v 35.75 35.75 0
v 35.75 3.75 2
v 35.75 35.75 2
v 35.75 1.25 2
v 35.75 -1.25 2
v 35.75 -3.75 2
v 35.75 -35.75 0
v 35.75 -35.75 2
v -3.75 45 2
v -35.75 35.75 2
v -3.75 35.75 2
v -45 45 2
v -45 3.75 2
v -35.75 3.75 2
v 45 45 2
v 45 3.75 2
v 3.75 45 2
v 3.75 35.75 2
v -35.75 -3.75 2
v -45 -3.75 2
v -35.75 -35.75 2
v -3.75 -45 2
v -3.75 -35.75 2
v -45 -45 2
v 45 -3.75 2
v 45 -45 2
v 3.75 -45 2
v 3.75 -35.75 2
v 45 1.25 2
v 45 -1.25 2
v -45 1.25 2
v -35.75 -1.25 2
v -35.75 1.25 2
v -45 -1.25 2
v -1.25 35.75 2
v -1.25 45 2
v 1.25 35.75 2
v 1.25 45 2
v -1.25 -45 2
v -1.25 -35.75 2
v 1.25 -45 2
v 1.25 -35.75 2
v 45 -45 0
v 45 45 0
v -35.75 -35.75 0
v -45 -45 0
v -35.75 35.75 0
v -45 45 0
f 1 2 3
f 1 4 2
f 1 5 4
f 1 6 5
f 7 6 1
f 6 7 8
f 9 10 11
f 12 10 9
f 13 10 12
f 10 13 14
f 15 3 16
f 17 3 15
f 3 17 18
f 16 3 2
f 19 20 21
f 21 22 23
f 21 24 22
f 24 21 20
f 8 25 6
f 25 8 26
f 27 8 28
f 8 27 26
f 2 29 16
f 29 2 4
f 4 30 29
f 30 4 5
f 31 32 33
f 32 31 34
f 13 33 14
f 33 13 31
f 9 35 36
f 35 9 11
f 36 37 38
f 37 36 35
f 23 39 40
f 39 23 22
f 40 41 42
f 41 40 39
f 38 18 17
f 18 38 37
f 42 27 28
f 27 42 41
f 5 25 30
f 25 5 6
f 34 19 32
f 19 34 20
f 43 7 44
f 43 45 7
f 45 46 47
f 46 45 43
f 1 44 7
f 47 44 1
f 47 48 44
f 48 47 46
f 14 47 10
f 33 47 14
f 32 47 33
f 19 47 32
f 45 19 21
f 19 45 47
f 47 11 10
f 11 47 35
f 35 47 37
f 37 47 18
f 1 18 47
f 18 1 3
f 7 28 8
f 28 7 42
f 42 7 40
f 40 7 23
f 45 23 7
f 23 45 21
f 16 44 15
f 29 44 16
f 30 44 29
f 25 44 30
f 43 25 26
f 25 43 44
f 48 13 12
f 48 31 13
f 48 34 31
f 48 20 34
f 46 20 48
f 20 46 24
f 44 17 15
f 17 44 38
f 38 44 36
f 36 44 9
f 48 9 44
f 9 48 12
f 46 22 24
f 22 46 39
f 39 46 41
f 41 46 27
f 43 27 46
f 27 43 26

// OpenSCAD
// Built by bench/smallmodels/features/compiler.py from a list of features.
$fn = 64;
difference() {
  union() {
    translate([0, 0, 0]) translate([-45, -45, 0]) cube([90, 90, 2]);
  }
  union() {
    translate([0, 0, 0]) rotate([0, 0, 0]) translate([-35.75, -35.75, 0]) cube([71.5, 71.5, 2]);
    translate([0, -177.5, 2]) rotate([0, 0, 0]) translate([-45, -1.25, 0]) cube([90, 2.5, 38]);
    translate([0, -87.5, 2]) rotate([0, 0, 0]) translate([-45, -1.25, 0]) cube([90, 2.5, 38]);
    translate([0, 2.5, 2]) rotate([0, 0, 0]) translate([-45, -1.25, 0]) cube([90, 2.5, 38]);
    translate([0, 92.5, 2]) rotate([0, 0, 0]) translate([-45, -1.25, 0]) cube([90, 2.5, 38]);
    translate([-177.5, 0, 2]) rotate([0, 0, 0]) translate([-1.25, -45, 0]) cube([2.5, 90, 38]);
    translate([-87.5, 0, 2]) rotate([0, 0, 0]) translate([-1.25, -45, 0]) cube([2.5, 90, 38]);
    translate([2.5, 0, 2]) rotate([0, 0, 0]) translate([-1.25, -45, 0]) cube([2.5, 90, 38]);
    translate([92.5, 0, 2]) rotate([0, 0, 0]) translate([-1.25, -45, 0]) cube([2.5, 90, 38]);
    translate([0, -92.5, 2]) rotate([0, 0, 0]) translate([-45, -1.25, 0]) cube([90, 2.5, 38]);
    translate([0, -2.5, 2]) rotate([0, 0, 0]) translate([-45, -1.25, 0]) cube([90, 2.5, 38]);
    translate([0, 87.5, 2]) rotate([0, 0, 0]) translate([-45, -1.25, 0]) cube([90, 2.5, 38]);
    translate([0, 177.5, 2]) rotate([0, 0, 0]) translate([-45, -1.25, 0]) cube([90, 2.5, 38]);
    translate([-92.5, 0, 2]) rotate([0, 0, 0]) translate([-1.25, -45, 0]) cube([2.5, 90, 38]);
    translate([-2.5, 0, 2]) rotate([0, 0, 0]) translate([-1.25, -45, 0]) cube([2.5, 90, 38]);
    translate([87.5, 0, 2]) rotate([0, 0, 0]) translate([-1.25, -45, 0]) cube([2.5, 90, 38]);
    translate([177.5, 0, 2]) rotate([0, 0, 0]) translate([-1.25, -45, 0]) cube([2.5, 90, 38]);
    translate([-42.5, 0, 32]) rotate([0, 0, 0]) translate([-6, -1.25, 0]) cube([12, 2.5, 8]);
  }
}
